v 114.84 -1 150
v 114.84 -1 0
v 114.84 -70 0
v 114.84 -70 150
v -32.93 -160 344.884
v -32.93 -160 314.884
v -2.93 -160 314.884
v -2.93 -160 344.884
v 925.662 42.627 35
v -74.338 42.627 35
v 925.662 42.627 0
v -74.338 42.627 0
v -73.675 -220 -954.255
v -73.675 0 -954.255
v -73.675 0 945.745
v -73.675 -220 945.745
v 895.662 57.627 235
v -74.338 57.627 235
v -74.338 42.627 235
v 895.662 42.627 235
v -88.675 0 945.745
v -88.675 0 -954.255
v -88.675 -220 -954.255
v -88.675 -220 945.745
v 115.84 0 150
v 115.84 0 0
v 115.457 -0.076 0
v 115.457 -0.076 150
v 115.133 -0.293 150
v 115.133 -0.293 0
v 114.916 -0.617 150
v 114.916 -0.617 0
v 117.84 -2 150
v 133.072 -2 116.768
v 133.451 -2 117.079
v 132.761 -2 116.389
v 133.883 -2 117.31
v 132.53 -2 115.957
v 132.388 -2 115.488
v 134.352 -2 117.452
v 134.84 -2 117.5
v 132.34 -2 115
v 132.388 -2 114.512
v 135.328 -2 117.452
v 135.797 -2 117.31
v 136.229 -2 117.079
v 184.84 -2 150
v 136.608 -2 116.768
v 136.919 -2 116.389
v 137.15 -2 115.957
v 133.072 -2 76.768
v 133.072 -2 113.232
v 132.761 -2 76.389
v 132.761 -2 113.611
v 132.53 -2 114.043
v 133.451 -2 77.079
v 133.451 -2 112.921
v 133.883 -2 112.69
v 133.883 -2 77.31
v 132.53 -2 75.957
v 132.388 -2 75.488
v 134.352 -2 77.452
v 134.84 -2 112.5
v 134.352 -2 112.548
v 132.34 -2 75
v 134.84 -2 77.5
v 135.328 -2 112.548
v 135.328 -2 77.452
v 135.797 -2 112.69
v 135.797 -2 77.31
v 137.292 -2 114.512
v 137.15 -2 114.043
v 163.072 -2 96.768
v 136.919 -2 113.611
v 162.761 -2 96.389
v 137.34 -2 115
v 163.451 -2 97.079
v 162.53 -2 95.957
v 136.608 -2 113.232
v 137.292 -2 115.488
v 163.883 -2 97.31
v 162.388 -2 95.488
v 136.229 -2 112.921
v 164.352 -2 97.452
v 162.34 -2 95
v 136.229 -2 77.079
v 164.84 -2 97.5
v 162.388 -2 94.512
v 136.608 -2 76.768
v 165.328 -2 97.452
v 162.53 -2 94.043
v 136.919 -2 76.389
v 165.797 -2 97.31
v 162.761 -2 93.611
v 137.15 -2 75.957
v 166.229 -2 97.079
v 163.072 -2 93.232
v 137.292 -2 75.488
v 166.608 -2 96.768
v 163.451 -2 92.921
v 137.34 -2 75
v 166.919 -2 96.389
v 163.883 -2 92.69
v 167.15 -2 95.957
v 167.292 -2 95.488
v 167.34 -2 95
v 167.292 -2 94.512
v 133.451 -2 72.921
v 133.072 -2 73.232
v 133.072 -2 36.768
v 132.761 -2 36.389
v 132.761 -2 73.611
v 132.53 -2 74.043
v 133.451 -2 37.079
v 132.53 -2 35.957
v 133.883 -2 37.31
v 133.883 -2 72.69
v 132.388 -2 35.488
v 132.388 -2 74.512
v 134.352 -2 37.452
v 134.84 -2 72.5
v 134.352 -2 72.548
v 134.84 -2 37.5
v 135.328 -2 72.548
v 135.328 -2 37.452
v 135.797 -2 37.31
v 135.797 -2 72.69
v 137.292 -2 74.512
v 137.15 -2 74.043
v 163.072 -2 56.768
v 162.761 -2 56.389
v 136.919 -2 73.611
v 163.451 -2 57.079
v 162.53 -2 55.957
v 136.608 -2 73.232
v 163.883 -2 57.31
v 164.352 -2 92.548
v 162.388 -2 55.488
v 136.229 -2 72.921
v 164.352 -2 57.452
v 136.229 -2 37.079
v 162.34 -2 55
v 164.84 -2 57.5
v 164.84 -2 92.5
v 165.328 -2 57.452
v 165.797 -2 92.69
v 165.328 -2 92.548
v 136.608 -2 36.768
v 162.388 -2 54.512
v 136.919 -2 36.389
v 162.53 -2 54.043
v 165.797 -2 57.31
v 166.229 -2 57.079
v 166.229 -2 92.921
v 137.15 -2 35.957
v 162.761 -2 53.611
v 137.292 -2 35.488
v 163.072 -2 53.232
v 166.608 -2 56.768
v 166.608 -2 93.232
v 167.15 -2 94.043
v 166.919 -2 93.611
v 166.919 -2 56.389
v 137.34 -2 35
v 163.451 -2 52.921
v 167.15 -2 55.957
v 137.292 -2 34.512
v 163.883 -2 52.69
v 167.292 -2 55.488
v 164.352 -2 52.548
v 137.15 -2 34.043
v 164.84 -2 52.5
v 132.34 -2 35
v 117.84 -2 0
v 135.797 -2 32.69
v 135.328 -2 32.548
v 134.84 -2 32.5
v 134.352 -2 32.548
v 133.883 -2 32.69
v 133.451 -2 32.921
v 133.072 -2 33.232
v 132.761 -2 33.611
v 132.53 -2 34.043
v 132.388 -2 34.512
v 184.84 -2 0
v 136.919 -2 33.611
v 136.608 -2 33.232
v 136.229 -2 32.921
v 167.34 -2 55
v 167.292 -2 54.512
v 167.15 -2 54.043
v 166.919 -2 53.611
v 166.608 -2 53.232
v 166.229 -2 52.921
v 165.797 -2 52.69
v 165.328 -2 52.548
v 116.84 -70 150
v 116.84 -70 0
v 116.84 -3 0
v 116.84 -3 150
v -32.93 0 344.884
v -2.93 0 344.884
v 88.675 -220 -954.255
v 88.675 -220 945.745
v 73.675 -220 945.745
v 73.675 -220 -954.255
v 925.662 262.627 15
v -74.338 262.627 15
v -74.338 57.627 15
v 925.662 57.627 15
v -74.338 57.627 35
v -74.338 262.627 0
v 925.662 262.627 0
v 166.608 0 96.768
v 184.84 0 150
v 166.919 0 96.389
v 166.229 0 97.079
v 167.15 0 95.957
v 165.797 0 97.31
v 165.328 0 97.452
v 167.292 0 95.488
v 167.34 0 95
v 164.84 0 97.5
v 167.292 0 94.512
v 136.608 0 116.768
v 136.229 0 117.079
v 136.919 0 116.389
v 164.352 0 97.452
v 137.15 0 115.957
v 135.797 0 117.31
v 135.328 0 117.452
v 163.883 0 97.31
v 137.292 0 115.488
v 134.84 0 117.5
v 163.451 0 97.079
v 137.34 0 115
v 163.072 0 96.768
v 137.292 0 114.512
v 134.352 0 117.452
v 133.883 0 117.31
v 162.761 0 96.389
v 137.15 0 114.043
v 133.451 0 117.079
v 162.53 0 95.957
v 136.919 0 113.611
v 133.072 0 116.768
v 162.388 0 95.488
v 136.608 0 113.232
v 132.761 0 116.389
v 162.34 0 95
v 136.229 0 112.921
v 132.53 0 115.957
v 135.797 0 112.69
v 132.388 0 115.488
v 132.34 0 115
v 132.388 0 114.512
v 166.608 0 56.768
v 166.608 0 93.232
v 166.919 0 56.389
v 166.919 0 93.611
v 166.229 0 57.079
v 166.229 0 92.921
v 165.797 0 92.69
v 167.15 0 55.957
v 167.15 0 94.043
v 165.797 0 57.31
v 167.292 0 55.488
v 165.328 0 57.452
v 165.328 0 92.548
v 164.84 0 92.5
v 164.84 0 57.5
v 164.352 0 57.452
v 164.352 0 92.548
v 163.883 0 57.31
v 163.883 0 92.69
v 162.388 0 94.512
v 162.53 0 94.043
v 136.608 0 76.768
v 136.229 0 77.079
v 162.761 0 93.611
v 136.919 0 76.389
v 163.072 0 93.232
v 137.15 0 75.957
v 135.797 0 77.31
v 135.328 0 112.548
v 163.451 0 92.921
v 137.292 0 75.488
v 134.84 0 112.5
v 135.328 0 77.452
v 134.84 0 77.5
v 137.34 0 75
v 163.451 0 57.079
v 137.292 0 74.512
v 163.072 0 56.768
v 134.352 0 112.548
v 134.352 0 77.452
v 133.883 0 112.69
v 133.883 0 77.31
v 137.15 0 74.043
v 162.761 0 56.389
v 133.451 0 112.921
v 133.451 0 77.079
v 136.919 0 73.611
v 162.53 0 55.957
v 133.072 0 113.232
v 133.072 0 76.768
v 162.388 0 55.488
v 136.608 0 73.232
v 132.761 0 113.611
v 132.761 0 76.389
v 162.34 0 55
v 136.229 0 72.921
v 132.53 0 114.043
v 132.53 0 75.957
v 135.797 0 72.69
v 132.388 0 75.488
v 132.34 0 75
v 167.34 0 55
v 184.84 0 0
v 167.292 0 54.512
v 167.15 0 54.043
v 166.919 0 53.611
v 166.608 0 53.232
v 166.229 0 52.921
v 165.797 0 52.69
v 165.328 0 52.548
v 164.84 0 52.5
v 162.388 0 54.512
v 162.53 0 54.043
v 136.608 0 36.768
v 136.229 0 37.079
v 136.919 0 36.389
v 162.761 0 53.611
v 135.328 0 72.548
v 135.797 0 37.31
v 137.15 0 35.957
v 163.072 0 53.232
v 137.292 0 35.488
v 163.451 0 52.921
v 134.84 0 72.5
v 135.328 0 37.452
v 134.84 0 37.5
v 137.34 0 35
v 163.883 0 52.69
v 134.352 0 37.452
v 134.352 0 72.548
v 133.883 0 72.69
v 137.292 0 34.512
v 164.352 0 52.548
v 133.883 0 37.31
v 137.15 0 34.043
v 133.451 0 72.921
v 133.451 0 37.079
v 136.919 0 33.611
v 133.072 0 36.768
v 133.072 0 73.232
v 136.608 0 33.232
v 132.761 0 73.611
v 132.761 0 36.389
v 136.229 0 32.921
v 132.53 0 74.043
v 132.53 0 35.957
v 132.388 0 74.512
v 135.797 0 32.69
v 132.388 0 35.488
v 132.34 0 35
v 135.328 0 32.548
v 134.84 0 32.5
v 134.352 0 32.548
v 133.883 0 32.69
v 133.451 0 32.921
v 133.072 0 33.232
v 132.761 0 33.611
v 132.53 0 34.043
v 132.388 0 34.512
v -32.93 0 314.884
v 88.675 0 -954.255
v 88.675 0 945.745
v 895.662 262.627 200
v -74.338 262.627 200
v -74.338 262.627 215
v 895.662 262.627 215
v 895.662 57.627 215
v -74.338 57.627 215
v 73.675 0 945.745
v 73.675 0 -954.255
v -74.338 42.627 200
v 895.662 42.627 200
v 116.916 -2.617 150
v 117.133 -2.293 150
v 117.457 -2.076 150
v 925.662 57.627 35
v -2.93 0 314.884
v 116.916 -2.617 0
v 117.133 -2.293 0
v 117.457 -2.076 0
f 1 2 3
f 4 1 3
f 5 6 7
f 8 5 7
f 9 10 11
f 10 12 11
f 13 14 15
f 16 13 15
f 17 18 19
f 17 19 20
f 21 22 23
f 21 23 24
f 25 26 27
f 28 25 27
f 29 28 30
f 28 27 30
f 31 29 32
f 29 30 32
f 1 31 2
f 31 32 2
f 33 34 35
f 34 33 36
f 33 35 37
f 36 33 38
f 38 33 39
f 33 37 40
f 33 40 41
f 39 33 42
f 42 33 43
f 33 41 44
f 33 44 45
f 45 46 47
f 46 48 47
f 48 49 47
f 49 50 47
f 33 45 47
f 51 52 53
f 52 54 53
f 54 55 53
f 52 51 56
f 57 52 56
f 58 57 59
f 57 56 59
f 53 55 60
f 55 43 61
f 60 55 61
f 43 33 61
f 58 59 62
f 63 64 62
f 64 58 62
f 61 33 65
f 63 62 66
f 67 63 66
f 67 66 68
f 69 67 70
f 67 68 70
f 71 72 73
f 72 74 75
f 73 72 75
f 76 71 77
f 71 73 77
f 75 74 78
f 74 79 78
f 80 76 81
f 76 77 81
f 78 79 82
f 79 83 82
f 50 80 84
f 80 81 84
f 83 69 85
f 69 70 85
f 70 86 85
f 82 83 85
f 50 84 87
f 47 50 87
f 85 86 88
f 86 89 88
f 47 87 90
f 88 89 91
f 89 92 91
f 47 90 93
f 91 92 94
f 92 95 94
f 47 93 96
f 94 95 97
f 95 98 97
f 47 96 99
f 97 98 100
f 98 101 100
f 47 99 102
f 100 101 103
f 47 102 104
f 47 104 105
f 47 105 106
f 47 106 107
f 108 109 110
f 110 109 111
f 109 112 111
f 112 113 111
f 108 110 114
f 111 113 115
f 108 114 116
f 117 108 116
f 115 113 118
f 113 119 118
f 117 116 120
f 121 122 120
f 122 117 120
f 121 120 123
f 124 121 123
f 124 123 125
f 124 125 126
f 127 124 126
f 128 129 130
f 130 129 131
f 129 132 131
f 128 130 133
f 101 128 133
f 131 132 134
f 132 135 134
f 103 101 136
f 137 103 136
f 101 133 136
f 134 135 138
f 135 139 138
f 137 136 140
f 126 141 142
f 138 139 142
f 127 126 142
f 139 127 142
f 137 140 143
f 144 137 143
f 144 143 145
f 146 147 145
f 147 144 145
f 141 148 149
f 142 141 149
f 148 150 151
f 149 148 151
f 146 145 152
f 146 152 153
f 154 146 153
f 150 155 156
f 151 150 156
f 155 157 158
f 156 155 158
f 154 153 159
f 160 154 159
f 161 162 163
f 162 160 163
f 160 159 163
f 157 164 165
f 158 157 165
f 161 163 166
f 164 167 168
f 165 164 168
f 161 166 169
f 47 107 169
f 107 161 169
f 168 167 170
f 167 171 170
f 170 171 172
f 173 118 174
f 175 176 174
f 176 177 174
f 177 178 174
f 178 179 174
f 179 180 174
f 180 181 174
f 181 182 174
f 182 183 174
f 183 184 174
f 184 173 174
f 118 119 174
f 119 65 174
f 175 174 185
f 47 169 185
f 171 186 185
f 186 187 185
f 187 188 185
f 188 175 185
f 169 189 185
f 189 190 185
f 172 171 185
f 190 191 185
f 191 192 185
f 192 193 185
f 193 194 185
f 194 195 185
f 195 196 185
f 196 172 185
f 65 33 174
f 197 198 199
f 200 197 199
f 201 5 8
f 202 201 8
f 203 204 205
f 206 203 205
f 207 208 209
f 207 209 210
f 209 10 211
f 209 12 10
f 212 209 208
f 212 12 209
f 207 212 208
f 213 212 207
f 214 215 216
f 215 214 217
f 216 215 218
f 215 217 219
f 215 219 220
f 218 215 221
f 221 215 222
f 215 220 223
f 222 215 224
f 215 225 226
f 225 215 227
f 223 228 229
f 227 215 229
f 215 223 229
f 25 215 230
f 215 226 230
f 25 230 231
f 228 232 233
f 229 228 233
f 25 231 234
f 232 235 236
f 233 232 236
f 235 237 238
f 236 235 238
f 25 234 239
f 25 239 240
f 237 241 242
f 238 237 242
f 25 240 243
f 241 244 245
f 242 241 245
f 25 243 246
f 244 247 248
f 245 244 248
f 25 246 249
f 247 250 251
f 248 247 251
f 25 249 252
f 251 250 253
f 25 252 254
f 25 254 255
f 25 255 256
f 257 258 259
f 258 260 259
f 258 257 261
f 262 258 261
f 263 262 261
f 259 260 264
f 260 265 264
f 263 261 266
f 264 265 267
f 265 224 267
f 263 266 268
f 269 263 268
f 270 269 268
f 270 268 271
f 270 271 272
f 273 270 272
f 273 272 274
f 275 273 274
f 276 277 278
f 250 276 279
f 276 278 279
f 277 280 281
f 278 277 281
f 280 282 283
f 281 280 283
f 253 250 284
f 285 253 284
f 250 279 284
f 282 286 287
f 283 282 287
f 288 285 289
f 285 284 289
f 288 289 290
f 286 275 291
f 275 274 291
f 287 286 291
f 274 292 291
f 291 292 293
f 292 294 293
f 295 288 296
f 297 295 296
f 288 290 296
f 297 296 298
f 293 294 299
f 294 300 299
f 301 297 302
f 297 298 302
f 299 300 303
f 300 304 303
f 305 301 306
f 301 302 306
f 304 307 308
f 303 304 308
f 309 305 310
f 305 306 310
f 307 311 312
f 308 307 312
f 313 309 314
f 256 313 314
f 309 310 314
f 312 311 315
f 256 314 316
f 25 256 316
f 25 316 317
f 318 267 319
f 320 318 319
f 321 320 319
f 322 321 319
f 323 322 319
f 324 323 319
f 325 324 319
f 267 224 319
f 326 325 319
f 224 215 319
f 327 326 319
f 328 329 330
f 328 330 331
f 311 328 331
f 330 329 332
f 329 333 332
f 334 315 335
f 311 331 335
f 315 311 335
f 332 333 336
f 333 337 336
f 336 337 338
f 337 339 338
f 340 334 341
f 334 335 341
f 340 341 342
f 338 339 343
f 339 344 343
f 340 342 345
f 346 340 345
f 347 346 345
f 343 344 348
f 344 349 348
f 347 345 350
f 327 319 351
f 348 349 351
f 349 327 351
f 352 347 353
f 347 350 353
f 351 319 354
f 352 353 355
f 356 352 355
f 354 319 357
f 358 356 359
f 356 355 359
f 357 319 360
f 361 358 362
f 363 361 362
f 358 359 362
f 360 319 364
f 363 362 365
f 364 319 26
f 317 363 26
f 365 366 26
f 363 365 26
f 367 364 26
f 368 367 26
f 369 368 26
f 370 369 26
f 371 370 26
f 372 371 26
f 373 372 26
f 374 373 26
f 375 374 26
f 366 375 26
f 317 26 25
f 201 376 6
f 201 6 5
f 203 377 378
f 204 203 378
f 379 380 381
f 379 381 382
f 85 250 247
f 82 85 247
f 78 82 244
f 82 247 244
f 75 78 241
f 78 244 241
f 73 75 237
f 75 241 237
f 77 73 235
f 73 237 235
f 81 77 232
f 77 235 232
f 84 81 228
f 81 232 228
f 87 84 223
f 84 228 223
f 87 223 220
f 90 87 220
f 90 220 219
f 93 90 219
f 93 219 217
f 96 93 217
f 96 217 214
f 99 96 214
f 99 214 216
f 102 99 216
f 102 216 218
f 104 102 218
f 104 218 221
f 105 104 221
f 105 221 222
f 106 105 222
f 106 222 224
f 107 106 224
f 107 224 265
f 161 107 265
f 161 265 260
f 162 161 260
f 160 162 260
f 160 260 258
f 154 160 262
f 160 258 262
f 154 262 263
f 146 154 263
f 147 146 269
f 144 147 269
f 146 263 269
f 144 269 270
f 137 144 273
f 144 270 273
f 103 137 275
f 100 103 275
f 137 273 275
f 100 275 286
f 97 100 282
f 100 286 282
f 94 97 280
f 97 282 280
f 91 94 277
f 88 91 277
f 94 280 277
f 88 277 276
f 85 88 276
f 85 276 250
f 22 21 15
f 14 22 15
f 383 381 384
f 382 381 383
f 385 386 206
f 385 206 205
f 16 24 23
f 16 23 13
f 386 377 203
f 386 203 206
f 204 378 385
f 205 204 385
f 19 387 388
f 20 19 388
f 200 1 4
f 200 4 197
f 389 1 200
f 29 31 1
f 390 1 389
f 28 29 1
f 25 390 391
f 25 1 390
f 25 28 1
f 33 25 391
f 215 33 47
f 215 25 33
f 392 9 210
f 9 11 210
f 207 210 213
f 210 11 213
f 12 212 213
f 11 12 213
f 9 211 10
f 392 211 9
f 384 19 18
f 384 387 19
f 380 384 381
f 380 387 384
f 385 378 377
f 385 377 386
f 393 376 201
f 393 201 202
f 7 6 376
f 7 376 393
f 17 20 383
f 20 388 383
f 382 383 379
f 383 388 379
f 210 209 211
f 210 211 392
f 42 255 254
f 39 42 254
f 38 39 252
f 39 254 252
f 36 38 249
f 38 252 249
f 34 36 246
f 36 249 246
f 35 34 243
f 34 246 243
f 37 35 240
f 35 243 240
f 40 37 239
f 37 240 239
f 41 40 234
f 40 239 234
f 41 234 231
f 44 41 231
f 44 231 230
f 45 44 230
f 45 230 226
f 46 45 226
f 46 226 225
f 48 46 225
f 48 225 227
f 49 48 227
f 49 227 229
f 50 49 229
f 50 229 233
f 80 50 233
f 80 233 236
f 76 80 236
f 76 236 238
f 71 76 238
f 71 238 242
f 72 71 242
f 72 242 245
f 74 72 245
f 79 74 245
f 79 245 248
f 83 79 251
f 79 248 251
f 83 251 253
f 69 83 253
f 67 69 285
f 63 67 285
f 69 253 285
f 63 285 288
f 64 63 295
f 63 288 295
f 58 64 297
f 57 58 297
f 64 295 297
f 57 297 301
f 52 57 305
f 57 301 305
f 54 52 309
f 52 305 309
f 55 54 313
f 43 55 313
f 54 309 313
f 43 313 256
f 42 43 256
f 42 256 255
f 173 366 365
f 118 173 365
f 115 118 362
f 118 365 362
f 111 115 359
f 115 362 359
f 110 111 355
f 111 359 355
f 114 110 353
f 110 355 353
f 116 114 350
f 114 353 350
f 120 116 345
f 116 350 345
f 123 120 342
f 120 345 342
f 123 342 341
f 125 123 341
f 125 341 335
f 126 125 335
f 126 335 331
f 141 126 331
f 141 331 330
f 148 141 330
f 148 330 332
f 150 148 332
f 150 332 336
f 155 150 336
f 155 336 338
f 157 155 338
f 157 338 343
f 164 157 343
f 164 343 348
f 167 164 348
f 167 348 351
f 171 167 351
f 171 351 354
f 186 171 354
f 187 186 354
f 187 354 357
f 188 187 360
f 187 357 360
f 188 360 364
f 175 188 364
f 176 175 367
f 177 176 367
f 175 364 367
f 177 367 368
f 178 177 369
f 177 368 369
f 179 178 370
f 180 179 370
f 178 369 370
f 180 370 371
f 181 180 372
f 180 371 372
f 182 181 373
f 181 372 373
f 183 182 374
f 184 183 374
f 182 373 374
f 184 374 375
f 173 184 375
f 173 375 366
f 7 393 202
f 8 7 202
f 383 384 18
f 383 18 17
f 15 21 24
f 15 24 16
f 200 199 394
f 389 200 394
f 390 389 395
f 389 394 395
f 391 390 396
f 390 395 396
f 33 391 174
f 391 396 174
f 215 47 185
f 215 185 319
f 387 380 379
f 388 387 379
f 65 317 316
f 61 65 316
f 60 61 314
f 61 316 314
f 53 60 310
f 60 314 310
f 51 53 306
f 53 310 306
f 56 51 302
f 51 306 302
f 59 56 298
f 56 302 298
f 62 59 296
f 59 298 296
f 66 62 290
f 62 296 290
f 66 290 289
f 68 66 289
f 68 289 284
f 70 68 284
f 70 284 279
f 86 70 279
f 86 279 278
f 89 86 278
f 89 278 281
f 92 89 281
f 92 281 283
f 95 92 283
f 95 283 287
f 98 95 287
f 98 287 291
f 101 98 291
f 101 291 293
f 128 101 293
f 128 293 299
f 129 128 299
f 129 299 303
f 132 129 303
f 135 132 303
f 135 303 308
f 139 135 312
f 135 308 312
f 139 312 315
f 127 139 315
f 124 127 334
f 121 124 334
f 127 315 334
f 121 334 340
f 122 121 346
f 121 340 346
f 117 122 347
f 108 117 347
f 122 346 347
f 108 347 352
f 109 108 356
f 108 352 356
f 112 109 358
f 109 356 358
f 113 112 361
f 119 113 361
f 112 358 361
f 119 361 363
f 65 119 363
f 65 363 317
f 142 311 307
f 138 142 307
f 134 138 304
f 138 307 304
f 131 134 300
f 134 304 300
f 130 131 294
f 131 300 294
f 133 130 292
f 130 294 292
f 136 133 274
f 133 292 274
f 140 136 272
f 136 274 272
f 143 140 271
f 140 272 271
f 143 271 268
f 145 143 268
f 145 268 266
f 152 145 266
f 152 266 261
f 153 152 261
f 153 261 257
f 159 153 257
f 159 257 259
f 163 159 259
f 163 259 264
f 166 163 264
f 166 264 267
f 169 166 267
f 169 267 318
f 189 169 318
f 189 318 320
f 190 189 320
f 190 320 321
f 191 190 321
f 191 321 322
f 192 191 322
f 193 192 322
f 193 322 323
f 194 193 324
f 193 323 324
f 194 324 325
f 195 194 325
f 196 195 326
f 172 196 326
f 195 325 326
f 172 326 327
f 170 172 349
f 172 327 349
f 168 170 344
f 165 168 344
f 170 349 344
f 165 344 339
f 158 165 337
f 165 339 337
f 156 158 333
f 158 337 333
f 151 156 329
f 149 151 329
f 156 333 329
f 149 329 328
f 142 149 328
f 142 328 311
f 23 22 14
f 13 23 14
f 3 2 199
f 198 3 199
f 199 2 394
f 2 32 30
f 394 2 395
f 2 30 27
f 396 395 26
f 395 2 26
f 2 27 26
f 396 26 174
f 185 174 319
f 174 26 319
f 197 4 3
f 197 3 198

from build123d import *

# Parameters (mm, degrees)
F0_W      = 15
F0_H      = 1900
F1_DEPTH  = 220
F2_W      = 30
F2_H      = 30
F3_DEPTH  = 160
F4_W      = 1000
F4_H      = 220
F5_DEPTH  = 15
F6_W      = 1000
F6_H      = 15
F7_DEPTH  = 20
F9_DEPTH  = 150
F11_D     = 5
F13_DEPTH = 30


with BuildPart() as f1:
    # F0 (on Front) → F1 (new body)
    with BuildSketch(Plane.XZ):
        with Locations((-81.1750778977, -4.2548663914)):
            Rectangle(F0_W, F0_H)
    extrude(amount=F1_DEPTH)


with BuildPart() as f3:
    # F2 (on Front) → F3 (new body)
    with BuildSketch(Plane.XZ):
        with Locations((-17.9298563302, 329.8843944073)):
            Rectangle(F2_W, F2_H)
    extrude(amount=F3_DEPTH)


with BuildPart() as f5:
    # F4 (on Top) → F5 (new body)
    with BuildSketch(Plane.XY):
        with Locations((425.6620332599, 152.626734823)):
            Rectangle(F4_W, F4_H)
    extrude(amount=F5_DEPTH)

    # F6 (on face) → F7 (join)
    with BuildSketch(Plane.XY.offset(15)):
        with Locations((425.6620332599, 50.126734823)):
            Rectangle(F6_W, F6_H)
    extrude(amount=F7_DEPTH)


with BuildPart() as f9:
    # F8 (on Top) → F9 (new body)
    with BuildSketch(Plane.XY):
        with BuildLine():
            Line((184.8400944316, -2), (184.8400944316, 0))
            Line((184.8400944316, 0), (115.8400944316, 0))
            ThreePointArc((115.8400944316, 0), (115.1329876504, -0.2928932188), (114.8400944316, -1))
            Line((114.8400944316, -1), (114.8400944316, -70))
            Line((114.8400944316, -70), (116.8400944316, -70))
            Line((116.8400944316, -70), (116.8400944316, -3))
            ThreePointArc((116.8400944316, -3), (117.1329876504, -2.2928932188), (117.8400944316, -2))
            Line((117.8400944316, -2), (184.8400944316, -2))
        make_face()
    extrude(amount=F9_DEPTH)

    # F11 (through all)
    with Locations(Plane.XZ.offset(2)):
        with Locations((134.8400944316, 115), (164.8400944316, 95), (134.8400944316, 75), (164.8400944316, 55), (134.8400944316, 35)):
            Hole(F11_D / 2)


with BuildPart() as f12_1:
    # F12: copy of F5
    add(f5.part.moved(Location((0, 0, 200))))

    # F13 (cut): a face of the model
    f13_faces = [f12_1.faces().sort_by_distance(p)[0] for p in [
        (925.6620332599, 144.0850681563, 208.9583333333),
    ]]
    extrude(f13_faces, amount=-F13_DEPTH, mode=Mode.SUBTRACT)


with BuildPart() as f14_1:
    # F14: instance of F1
    add(f1.part.mirror(Plane.YZ))


solid = Compound([f1.part, f3.part, f5.part, f9.part, f12_1.part, f14_1.part])
